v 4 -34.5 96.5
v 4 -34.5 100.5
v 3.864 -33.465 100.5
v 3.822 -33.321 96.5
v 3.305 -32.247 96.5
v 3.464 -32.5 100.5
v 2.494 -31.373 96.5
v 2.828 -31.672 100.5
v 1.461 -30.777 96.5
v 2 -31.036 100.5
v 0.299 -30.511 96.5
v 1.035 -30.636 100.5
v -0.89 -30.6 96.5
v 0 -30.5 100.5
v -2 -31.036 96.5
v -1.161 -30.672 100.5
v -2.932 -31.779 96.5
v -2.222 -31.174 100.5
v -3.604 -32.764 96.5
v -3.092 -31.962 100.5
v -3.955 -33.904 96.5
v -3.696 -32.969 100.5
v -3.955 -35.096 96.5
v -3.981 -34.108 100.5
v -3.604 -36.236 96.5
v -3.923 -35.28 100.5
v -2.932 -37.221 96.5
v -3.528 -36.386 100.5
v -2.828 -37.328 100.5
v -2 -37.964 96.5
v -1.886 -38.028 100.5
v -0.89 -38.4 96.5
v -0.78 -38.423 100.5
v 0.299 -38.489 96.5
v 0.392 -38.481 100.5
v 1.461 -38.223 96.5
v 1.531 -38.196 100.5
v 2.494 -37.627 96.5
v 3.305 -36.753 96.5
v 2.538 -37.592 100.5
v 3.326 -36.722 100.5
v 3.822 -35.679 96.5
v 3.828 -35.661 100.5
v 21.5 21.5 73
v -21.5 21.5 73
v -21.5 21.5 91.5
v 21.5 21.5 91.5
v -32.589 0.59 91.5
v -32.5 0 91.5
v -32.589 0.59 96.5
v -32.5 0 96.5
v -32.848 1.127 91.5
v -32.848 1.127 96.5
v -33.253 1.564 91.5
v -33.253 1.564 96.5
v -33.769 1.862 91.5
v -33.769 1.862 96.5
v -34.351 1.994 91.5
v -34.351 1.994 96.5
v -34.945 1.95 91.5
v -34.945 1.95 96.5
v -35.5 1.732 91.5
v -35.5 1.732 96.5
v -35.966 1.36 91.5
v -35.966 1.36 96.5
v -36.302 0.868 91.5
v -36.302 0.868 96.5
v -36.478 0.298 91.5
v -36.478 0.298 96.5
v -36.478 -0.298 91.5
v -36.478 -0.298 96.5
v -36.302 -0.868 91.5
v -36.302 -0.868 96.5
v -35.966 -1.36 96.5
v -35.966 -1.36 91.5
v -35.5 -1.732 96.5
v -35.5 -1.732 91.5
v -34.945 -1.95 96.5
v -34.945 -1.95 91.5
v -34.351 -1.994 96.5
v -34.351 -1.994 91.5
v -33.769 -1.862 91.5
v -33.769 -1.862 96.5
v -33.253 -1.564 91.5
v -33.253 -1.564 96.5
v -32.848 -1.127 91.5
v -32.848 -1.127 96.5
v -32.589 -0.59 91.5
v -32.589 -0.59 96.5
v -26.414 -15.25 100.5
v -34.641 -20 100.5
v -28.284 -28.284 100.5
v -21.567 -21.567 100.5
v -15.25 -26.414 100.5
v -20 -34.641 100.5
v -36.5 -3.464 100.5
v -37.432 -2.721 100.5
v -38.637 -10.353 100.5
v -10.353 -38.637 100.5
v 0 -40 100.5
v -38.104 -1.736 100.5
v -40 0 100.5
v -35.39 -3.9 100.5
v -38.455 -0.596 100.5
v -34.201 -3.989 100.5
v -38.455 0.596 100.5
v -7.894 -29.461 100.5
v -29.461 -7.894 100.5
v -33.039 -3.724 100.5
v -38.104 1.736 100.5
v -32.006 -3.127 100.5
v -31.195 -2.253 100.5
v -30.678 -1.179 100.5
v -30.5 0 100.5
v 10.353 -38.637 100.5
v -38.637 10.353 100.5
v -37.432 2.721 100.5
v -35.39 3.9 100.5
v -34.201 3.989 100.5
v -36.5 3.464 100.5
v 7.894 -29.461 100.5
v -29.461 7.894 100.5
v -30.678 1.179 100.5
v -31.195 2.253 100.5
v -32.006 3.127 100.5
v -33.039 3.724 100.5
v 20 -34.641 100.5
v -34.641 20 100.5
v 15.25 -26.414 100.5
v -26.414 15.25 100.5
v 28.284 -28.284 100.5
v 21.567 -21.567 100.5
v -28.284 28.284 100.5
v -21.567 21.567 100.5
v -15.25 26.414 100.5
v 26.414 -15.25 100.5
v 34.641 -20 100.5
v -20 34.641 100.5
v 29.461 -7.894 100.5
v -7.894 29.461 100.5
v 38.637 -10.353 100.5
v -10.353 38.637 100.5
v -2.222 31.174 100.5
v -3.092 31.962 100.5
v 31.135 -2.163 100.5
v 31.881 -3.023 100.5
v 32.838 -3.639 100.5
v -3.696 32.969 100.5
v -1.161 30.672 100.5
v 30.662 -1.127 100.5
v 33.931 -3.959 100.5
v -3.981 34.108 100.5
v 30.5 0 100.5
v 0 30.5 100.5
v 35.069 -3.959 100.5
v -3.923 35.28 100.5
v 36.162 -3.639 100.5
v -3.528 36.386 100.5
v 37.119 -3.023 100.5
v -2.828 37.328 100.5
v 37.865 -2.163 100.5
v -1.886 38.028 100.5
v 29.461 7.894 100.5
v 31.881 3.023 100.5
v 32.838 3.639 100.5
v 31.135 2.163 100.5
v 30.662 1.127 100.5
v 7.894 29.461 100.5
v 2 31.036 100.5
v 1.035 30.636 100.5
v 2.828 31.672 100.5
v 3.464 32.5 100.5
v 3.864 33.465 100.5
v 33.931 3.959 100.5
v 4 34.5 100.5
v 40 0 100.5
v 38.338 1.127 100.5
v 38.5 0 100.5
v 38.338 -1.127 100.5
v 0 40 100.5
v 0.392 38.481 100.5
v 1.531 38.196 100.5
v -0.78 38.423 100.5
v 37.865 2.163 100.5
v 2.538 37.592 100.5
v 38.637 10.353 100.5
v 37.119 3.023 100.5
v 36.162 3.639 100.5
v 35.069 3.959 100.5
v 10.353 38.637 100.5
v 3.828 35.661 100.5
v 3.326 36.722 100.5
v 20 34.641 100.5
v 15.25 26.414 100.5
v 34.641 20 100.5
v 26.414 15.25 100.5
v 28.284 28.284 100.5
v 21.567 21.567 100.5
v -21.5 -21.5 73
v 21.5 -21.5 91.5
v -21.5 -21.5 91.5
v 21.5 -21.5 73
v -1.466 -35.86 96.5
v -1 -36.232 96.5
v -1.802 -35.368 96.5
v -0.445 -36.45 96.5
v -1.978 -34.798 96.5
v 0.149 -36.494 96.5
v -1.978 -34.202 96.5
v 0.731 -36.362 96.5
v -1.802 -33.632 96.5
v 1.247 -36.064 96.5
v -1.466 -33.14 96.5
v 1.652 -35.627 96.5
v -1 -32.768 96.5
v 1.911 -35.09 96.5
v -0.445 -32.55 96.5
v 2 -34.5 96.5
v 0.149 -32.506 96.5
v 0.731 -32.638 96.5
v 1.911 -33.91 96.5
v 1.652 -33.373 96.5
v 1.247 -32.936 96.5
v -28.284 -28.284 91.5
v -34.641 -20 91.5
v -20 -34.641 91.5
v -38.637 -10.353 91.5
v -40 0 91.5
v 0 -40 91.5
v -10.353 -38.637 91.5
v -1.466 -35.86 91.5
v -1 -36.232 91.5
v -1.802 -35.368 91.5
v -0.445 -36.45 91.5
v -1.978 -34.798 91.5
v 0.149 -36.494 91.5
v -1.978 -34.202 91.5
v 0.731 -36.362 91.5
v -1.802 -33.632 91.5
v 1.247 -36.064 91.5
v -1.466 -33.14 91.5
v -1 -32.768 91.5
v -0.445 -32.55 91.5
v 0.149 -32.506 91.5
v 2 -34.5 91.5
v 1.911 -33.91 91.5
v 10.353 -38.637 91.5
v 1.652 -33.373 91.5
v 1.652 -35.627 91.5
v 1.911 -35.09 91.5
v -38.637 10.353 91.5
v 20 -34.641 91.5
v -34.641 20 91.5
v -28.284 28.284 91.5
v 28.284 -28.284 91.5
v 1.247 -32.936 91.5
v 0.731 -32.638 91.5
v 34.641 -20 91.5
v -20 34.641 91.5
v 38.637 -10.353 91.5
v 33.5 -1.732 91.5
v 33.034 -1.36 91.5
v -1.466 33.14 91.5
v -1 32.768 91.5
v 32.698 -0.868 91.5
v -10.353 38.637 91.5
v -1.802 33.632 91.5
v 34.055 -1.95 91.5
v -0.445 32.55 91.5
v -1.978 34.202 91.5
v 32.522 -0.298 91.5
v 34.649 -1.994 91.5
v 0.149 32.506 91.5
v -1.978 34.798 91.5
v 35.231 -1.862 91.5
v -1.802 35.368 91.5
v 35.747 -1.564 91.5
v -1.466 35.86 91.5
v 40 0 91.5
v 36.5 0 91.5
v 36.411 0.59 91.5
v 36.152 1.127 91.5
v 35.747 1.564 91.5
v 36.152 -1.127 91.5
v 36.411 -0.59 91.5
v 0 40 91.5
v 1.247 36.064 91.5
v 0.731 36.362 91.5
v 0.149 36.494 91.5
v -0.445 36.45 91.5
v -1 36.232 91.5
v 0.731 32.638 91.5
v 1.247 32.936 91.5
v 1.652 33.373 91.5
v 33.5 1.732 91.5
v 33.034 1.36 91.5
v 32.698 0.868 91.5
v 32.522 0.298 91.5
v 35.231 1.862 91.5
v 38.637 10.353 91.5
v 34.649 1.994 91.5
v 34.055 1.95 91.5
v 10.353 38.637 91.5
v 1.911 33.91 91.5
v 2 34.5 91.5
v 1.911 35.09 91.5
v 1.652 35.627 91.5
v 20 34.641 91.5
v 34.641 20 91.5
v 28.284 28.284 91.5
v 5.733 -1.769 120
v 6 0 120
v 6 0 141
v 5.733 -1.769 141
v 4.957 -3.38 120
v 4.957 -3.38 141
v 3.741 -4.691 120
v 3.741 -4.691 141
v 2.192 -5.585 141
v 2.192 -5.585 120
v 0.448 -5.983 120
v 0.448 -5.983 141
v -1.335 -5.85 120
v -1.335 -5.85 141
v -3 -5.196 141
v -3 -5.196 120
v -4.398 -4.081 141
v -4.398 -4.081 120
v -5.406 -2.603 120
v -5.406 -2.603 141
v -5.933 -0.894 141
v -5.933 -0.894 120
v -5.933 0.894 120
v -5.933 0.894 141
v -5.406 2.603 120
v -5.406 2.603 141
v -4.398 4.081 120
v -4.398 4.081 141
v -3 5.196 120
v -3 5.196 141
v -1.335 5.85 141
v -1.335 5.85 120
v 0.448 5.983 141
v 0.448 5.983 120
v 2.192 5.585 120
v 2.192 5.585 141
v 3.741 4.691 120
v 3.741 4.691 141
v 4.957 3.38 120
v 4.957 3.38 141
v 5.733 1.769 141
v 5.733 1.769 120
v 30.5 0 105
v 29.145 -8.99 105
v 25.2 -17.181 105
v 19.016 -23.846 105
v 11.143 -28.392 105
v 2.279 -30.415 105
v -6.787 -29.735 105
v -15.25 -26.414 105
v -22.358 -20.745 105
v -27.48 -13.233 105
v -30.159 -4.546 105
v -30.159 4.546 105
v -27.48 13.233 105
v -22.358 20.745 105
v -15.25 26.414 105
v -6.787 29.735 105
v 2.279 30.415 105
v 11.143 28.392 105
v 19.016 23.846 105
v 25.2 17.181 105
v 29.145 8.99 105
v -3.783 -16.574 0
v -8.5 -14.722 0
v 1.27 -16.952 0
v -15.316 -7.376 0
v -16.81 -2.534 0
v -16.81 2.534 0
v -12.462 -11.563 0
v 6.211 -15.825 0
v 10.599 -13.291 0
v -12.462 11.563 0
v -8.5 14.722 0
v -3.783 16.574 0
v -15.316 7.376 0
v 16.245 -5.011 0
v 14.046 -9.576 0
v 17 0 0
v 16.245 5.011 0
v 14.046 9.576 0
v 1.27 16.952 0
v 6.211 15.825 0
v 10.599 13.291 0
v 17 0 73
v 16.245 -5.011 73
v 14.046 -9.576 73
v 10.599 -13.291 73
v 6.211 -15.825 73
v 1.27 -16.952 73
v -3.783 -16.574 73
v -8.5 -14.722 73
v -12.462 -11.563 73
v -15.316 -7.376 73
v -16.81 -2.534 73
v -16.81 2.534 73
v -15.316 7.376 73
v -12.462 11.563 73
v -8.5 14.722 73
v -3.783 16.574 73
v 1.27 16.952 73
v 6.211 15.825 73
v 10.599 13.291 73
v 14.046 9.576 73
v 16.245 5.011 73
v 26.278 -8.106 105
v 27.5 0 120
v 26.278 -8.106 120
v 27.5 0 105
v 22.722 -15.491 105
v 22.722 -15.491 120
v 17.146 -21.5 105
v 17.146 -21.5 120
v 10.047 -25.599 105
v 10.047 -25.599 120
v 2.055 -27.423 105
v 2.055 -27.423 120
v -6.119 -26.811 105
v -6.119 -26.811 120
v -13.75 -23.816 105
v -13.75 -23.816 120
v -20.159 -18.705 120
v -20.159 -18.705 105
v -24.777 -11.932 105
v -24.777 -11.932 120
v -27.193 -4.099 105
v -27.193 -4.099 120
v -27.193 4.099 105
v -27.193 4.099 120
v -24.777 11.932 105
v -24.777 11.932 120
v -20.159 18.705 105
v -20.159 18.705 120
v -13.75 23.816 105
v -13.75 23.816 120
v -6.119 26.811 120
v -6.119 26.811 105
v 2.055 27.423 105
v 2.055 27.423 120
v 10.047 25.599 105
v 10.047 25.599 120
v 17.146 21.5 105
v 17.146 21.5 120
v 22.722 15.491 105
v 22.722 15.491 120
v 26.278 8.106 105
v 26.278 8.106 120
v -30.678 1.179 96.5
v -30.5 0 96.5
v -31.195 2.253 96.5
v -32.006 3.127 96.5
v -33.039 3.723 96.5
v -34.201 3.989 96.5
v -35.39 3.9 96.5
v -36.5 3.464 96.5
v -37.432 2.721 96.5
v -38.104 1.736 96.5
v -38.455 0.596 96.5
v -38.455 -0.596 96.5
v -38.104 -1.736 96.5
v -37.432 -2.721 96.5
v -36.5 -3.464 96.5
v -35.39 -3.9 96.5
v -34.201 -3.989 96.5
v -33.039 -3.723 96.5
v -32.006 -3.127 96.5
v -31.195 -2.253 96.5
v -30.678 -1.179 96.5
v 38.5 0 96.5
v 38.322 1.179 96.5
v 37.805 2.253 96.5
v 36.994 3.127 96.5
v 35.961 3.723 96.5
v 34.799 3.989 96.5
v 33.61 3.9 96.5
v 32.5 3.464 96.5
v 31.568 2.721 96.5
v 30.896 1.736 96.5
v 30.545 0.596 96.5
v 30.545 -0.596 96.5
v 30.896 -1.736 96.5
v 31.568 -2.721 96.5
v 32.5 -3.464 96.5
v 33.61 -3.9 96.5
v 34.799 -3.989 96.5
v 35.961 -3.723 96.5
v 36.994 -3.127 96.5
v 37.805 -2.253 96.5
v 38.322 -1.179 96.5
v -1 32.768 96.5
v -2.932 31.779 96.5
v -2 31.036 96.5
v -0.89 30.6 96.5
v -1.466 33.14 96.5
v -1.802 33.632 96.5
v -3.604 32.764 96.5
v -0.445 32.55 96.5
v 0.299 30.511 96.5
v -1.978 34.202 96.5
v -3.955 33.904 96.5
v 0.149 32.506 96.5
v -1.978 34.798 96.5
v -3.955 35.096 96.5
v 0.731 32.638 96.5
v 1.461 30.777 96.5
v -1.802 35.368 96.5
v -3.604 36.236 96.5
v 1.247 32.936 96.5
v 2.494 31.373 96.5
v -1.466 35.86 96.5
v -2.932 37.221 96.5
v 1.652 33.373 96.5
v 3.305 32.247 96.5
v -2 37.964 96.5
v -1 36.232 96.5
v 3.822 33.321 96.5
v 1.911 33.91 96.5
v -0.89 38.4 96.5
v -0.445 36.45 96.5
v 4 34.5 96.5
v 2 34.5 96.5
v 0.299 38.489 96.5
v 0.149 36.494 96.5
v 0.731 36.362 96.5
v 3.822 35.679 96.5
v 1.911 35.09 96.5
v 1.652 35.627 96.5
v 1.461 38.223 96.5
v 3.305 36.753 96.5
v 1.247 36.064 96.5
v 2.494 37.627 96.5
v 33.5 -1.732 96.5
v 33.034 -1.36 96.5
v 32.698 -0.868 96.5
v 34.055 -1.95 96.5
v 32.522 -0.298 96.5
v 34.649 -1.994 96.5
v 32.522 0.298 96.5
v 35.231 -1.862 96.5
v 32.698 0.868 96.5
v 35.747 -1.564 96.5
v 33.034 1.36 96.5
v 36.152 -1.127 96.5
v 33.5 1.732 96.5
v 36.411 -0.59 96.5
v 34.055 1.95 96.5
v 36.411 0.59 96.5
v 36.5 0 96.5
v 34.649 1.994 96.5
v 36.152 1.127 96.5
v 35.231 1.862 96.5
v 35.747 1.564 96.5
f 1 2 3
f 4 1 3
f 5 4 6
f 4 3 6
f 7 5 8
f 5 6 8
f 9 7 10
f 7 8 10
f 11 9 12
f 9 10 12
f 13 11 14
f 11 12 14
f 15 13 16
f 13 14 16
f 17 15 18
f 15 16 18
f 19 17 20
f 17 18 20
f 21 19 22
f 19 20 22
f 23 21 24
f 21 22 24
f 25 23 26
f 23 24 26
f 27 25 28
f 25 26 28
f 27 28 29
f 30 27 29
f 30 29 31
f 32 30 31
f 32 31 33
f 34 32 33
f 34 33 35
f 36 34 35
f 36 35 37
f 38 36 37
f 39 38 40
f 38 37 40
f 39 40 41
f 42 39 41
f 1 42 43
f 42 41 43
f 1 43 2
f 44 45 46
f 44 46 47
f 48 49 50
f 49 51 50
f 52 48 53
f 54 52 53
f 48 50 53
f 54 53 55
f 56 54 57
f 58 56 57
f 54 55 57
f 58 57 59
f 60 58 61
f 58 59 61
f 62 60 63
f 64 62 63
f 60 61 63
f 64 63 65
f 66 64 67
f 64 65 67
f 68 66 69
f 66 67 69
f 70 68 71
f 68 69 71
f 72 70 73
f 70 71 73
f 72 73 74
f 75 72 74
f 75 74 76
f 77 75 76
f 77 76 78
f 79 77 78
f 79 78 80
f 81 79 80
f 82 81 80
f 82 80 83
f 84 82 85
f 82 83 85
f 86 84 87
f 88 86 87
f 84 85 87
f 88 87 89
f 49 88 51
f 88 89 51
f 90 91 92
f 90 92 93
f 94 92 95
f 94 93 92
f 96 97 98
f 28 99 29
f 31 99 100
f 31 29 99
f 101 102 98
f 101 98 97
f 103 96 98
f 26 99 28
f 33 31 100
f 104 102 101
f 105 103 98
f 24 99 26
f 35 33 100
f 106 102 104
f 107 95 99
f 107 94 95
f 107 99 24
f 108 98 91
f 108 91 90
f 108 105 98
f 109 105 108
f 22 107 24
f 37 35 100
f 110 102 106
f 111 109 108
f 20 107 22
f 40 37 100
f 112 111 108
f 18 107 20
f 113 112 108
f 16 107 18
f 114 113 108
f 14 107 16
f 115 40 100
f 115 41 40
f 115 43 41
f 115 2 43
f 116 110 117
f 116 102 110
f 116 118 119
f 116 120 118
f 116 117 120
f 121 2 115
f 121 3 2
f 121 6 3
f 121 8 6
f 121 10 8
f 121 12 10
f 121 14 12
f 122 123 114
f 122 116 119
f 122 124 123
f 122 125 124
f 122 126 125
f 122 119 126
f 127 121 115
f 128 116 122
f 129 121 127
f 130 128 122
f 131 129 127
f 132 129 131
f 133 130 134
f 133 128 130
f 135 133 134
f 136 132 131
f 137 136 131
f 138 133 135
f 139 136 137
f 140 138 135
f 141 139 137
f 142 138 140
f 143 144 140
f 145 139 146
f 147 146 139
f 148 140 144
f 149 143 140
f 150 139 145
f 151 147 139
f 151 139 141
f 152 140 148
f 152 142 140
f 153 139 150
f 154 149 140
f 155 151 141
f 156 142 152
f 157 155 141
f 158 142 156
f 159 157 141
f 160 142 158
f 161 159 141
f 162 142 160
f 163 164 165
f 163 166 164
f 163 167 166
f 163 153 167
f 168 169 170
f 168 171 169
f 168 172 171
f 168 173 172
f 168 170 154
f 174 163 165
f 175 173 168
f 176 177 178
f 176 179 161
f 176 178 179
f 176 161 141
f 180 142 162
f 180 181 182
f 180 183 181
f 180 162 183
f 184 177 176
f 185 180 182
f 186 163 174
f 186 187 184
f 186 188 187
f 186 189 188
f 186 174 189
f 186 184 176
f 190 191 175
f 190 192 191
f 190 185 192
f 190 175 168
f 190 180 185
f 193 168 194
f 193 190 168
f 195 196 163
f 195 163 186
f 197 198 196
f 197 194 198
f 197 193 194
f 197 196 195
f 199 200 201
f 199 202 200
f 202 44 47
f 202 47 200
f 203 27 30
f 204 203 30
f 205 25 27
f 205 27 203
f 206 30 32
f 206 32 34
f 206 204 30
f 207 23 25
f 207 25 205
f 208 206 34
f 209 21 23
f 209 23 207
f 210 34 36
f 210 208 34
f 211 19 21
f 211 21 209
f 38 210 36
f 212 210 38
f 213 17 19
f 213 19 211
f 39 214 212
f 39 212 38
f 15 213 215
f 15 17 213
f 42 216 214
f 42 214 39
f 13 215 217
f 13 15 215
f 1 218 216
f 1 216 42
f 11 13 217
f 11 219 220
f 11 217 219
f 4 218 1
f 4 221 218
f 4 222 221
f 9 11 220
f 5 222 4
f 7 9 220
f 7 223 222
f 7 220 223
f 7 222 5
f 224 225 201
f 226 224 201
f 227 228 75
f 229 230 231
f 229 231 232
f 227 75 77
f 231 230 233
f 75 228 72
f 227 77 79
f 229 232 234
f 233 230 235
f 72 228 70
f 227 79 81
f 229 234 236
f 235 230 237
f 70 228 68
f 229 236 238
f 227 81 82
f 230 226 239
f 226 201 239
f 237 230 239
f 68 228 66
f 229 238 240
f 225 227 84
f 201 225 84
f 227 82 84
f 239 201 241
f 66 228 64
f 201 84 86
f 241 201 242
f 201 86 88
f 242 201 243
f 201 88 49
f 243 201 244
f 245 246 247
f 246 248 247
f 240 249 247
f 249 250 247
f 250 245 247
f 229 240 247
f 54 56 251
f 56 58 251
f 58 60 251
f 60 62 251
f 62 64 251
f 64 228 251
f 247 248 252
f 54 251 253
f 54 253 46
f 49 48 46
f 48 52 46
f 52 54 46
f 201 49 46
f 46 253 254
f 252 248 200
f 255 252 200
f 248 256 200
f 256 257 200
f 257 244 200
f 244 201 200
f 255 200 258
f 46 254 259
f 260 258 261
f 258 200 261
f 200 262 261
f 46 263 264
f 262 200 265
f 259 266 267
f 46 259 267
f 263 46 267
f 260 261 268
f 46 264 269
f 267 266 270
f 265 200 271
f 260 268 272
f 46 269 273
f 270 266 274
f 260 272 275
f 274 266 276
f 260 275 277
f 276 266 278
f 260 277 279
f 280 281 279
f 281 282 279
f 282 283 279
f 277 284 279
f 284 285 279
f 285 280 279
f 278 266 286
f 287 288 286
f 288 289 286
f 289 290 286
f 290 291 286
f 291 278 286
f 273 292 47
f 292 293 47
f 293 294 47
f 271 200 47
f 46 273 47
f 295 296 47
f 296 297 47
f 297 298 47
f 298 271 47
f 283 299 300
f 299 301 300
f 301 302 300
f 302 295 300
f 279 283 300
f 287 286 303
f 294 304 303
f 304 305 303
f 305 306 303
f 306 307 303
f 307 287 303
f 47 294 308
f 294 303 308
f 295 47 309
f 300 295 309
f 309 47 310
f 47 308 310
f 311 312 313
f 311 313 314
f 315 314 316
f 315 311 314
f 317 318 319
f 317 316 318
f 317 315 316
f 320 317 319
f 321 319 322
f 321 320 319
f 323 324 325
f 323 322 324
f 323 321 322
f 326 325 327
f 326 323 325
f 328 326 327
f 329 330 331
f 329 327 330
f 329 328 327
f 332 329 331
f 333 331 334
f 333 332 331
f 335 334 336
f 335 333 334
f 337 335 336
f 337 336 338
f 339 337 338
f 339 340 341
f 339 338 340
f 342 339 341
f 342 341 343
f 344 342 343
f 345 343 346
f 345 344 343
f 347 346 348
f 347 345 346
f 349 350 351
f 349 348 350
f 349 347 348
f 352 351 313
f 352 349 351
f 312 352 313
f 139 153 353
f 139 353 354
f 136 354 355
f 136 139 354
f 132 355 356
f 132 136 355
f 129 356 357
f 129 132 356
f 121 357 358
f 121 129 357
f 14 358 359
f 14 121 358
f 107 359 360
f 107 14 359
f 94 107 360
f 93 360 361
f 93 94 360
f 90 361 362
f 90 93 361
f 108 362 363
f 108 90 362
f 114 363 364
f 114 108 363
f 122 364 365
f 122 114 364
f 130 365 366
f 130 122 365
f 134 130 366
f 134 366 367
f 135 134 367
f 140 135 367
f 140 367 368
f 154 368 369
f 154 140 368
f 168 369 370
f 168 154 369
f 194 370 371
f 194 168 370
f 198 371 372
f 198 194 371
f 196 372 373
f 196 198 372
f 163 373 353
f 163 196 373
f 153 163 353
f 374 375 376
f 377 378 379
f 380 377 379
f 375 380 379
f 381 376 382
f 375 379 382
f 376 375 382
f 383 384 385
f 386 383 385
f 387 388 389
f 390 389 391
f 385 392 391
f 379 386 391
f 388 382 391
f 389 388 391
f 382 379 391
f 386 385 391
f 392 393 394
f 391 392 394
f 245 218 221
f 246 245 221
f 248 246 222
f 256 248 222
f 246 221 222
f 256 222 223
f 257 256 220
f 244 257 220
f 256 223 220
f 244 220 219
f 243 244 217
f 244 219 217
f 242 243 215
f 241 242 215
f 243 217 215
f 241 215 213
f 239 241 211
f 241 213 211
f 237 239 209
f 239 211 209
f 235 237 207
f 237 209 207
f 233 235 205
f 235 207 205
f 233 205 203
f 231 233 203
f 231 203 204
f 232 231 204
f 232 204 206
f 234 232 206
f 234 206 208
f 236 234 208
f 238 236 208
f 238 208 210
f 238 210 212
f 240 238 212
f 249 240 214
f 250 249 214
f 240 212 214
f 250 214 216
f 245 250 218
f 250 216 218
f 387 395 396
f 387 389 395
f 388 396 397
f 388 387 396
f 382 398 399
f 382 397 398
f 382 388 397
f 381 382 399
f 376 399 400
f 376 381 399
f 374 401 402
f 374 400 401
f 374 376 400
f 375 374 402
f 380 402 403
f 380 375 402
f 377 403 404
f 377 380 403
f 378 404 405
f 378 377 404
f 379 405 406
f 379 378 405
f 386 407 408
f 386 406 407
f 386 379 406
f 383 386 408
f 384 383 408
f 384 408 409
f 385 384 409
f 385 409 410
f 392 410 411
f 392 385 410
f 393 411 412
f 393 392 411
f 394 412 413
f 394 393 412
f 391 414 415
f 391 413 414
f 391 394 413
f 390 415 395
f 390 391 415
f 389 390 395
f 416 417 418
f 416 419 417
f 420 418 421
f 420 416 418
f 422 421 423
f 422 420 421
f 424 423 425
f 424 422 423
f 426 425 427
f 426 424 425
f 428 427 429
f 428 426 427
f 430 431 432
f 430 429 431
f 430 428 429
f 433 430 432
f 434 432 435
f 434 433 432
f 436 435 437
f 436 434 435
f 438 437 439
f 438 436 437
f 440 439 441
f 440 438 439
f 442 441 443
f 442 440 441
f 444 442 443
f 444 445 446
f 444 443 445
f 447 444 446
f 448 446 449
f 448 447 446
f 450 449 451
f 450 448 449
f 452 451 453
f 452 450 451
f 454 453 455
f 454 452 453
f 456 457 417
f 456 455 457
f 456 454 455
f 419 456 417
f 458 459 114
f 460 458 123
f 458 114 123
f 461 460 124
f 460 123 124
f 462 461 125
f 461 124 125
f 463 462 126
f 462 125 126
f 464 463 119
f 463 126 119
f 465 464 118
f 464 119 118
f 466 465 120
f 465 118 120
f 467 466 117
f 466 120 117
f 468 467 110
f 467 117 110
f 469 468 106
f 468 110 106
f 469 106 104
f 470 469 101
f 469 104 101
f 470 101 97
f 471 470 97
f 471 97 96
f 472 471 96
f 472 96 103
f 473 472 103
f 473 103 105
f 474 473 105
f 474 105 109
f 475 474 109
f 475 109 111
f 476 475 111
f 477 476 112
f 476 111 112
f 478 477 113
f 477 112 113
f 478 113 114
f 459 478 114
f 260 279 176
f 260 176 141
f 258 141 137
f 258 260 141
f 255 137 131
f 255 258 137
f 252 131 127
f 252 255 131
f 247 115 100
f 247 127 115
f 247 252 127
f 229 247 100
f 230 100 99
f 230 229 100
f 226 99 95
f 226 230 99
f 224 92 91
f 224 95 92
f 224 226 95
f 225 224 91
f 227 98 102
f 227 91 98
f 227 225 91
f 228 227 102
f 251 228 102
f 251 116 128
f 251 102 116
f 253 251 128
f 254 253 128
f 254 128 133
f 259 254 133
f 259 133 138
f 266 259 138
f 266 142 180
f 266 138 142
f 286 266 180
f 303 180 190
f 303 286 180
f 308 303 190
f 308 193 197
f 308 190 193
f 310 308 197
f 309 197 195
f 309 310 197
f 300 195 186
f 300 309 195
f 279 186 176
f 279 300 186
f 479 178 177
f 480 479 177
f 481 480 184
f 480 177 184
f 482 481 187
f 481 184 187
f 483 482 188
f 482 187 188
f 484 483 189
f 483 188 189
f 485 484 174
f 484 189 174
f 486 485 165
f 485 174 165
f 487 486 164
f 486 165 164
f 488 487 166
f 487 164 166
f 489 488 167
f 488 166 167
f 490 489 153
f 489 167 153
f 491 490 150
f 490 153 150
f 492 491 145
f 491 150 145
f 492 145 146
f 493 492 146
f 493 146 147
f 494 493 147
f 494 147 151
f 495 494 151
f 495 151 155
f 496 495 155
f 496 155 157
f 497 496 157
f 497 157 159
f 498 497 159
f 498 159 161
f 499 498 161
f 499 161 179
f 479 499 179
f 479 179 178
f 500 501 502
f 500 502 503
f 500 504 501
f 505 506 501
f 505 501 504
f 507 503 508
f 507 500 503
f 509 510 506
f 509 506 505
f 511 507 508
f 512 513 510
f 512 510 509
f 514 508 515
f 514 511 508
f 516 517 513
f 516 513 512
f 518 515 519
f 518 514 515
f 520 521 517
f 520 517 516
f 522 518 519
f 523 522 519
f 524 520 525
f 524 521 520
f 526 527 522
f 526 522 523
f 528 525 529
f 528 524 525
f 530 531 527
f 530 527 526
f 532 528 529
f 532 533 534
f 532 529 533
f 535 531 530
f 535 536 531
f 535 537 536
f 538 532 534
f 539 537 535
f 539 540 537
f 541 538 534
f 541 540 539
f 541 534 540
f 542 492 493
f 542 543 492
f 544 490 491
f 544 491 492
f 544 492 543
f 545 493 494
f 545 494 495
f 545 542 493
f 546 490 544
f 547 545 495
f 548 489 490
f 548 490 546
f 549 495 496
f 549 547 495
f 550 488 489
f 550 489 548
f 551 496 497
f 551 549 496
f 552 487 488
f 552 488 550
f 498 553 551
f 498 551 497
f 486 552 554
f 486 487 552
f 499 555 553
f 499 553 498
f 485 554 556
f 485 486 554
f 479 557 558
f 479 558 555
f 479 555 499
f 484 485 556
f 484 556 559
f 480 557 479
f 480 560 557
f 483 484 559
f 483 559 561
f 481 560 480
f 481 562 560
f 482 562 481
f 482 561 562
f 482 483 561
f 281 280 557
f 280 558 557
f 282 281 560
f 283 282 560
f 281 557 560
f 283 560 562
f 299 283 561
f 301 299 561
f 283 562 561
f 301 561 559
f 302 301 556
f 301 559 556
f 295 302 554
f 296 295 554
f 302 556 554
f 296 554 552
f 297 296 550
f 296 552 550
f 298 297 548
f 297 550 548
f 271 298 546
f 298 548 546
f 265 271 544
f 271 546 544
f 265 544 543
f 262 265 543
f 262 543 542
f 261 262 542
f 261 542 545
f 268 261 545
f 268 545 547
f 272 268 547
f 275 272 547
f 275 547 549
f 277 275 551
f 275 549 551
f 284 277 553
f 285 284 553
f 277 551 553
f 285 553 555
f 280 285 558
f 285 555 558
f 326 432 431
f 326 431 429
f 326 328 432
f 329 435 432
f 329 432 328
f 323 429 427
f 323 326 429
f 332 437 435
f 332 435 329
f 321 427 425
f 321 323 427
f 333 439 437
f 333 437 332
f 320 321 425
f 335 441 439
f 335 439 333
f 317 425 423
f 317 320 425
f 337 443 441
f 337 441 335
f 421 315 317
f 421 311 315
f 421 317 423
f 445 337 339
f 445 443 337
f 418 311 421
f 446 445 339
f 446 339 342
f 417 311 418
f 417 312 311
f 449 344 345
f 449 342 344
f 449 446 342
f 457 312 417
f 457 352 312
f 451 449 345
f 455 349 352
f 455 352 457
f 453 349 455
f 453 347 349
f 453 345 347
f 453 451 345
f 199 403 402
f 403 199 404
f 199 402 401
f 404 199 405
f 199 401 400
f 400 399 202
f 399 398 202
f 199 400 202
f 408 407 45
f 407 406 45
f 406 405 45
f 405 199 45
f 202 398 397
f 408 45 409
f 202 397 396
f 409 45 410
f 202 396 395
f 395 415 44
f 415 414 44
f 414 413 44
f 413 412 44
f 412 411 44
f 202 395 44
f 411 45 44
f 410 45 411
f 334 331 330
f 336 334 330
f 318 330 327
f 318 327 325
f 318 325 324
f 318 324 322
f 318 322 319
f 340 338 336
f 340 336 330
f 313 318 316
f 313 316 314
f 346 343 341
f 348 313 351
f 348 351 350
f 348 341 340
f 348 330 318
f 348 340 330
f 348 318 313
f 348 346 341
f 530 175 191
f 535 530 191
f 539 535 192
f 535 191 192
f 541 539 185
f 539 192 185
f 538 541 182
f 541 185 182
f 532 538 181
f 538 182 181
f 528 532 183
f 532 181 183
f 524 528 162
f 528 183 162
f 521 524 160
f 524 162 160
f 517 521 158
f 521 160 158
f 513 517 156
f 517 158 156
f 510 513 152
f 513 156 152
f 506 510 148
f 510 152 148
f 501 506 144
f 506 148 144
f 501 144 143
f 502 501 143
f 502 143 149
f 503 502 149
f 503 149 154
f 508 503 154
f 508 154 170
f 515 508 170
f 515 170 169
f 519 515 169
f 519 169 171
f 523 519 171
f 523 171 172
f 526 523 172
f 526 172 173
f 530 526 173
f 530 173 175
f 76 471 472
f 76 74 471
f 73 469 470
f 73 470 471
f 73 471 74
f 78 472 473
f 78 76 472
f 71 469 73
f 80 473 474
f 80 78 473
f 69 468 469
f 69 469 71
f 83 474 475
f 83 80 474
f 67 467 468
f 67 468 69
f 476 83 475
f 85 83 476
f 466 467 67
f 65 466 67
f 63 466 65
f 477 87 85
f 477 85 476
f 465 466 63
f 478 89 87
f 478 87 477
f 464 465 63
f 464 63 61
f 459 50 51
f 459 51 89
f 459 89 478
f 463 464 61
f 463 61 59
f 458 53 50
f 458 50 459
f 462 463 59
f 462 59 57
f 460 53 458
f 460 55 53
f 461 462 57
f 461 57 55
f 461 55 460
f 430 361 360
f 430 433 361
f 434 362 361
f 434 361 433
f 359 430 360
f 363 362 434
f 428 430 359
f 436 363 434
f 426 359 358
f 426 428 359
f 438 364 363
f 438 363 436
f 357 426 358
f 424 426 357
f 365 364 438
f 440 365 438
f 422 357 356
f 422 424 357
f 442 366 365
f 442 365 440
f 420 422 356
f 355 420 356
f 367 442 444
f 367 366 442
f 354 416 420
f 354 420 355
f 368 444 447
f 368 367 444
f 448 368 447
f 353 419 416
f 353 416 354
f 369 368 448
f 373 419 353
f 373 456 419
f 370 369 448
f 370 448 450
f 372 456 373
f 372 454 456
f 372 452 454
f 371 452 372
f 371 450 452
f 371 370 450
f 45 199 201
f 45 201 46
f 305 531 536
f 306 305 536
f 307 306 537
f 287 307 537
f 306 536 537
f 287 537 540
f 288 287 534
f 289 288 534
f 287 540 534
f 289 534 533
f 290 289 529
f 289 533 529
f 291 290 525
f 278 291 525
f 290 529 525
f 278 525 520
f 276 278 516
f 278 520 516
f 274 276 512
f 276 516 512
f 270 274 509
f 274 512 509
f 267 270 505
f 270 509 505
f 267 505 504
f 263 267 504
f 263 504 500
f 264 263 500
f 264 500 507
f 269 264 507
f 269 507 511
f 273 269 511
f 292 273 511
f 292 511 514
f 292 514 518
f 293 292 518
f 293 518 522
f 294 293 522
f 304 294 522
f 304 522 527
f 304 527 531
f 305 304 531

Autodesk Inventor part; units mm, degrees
ref_plane "YZ Plane" through (0, 0, 0) normal (1, 0, 0) x (0, 1, 0)
ref_plane "XZ Plane" through (0, 0, 0) normal (0, 1, 0) x (-1, 0, 0)
ref_plane "XY Plane" through (0, 0, 0) normal (0, 0, 1) x (1, 0, 0)
sketch "スケッチ1" plane through (0, 0, 0) normal (0, 0, 1) x (1, 0, 0)
  circle A0 centre (0, 0) radius 17
  dimension "d0" = 34
extrude "押し出し1" add sketch "スケッチ1" along normal blind 73
sketch "スケッチ2" plane through (0, 0, 73) normal (0, 0, 1) x (1, 0, 0)
  line L0 (-21.5, 21.5) -> (21.5, 21.5)
  line L1 (21.5, 21.5) -> (21.5, -21.5)
  line L2 (21.5, -21.5) -> (-21.5, -21.5)
  line L3 (-21.5, -21.5) -> (-21.5, 21.5)
  line L4 (-21.5, 21.5) -> (21.5, -21.5) construction
  line L5 (21.5, 21.5) -> (-21.5, -21.5) construction
  point P0 (0, 0)
  dimension "d3" = 43
  dimension "d4" = 43
extrude "押し出し2" add sketch "スケッチ2" along normal blind 18.5
sketch "スケッチ3" plane through (0, 0, 91.5) normal (0, 0, 1) x (1, 0, 0)
  circle A0 centre (0, 0) radius 40
  dimension "d7" = 80
extrude "押し出し3" add sketch "スケッチ3" along normal blind 9
sketch "スケッチ4" plane through (0, 0, 100.5) normal (0, 0, 1) x (1, 0, 0)
  circle A0 centre (0, 0) radius 30.5
  dimension "d10" = 61
extrude "押し出し4" add sketch "スケッチ4" along normal blind 4.5
sketch "スケッチ5" plane through (0, 0, 105) normal (0, 0, 1) x (1, 0, 0)
  circle A0 centre (0, 0) radius 27.5
  dimension "d13" = 55
extrude "押し出し5" add sketch "スケッチ5" along normal blind 15
sketch "スケッチ6" plane through (0, 0, 120) normal (0, 0, 1) x (1, 0, 0)
  circle A0 centre (0, 0) radius 6
  dimension "d16" = 12
extrude "押し出し6" add sketch "スケッチ6" along normal blind 21
sketch "スケッチ7" plane through (0, 0, 100.5) normal (0, 0, 1) x (1, 0, 0)
  circle A0 centre (0, 0) radius 34.5 construction
  circle A1 centre (-34.5, 0) radius 2
  circle A2 centre (0, -34.5) radius 2
  circle A3 centre (34.5, 0) radius 2
  circle A4 centre (0, 34.5) radius 2
  dimension "d19" = 69
  dimension "d20" = 4
  dimension "d23" = 360
extrude "押し出し7" cut sketch "スケッチ7" against normal blind 9
sketch "スケッチ8" plane through (0, 0, 100.5) normal (0, 0, 1) x (1, 0, 0)
  circle A0 centre (0, 0) radius 34.5 construction
  circle A1 centre (-34.5, 0) radius 4
  circle A2 centre (0, -34.5) radius 4
  circle A3 centre (34.5, 0) radius 4
  circle A4 centre (0, 34.5) radius 4
  dimension "d27" = 69
  dimension "d28" = 8
  dimension "d31" = 360
extrude "押し出し8" cut sketch "スケッチ8" against normal blind 4
properties part number "TukasaMoter"
